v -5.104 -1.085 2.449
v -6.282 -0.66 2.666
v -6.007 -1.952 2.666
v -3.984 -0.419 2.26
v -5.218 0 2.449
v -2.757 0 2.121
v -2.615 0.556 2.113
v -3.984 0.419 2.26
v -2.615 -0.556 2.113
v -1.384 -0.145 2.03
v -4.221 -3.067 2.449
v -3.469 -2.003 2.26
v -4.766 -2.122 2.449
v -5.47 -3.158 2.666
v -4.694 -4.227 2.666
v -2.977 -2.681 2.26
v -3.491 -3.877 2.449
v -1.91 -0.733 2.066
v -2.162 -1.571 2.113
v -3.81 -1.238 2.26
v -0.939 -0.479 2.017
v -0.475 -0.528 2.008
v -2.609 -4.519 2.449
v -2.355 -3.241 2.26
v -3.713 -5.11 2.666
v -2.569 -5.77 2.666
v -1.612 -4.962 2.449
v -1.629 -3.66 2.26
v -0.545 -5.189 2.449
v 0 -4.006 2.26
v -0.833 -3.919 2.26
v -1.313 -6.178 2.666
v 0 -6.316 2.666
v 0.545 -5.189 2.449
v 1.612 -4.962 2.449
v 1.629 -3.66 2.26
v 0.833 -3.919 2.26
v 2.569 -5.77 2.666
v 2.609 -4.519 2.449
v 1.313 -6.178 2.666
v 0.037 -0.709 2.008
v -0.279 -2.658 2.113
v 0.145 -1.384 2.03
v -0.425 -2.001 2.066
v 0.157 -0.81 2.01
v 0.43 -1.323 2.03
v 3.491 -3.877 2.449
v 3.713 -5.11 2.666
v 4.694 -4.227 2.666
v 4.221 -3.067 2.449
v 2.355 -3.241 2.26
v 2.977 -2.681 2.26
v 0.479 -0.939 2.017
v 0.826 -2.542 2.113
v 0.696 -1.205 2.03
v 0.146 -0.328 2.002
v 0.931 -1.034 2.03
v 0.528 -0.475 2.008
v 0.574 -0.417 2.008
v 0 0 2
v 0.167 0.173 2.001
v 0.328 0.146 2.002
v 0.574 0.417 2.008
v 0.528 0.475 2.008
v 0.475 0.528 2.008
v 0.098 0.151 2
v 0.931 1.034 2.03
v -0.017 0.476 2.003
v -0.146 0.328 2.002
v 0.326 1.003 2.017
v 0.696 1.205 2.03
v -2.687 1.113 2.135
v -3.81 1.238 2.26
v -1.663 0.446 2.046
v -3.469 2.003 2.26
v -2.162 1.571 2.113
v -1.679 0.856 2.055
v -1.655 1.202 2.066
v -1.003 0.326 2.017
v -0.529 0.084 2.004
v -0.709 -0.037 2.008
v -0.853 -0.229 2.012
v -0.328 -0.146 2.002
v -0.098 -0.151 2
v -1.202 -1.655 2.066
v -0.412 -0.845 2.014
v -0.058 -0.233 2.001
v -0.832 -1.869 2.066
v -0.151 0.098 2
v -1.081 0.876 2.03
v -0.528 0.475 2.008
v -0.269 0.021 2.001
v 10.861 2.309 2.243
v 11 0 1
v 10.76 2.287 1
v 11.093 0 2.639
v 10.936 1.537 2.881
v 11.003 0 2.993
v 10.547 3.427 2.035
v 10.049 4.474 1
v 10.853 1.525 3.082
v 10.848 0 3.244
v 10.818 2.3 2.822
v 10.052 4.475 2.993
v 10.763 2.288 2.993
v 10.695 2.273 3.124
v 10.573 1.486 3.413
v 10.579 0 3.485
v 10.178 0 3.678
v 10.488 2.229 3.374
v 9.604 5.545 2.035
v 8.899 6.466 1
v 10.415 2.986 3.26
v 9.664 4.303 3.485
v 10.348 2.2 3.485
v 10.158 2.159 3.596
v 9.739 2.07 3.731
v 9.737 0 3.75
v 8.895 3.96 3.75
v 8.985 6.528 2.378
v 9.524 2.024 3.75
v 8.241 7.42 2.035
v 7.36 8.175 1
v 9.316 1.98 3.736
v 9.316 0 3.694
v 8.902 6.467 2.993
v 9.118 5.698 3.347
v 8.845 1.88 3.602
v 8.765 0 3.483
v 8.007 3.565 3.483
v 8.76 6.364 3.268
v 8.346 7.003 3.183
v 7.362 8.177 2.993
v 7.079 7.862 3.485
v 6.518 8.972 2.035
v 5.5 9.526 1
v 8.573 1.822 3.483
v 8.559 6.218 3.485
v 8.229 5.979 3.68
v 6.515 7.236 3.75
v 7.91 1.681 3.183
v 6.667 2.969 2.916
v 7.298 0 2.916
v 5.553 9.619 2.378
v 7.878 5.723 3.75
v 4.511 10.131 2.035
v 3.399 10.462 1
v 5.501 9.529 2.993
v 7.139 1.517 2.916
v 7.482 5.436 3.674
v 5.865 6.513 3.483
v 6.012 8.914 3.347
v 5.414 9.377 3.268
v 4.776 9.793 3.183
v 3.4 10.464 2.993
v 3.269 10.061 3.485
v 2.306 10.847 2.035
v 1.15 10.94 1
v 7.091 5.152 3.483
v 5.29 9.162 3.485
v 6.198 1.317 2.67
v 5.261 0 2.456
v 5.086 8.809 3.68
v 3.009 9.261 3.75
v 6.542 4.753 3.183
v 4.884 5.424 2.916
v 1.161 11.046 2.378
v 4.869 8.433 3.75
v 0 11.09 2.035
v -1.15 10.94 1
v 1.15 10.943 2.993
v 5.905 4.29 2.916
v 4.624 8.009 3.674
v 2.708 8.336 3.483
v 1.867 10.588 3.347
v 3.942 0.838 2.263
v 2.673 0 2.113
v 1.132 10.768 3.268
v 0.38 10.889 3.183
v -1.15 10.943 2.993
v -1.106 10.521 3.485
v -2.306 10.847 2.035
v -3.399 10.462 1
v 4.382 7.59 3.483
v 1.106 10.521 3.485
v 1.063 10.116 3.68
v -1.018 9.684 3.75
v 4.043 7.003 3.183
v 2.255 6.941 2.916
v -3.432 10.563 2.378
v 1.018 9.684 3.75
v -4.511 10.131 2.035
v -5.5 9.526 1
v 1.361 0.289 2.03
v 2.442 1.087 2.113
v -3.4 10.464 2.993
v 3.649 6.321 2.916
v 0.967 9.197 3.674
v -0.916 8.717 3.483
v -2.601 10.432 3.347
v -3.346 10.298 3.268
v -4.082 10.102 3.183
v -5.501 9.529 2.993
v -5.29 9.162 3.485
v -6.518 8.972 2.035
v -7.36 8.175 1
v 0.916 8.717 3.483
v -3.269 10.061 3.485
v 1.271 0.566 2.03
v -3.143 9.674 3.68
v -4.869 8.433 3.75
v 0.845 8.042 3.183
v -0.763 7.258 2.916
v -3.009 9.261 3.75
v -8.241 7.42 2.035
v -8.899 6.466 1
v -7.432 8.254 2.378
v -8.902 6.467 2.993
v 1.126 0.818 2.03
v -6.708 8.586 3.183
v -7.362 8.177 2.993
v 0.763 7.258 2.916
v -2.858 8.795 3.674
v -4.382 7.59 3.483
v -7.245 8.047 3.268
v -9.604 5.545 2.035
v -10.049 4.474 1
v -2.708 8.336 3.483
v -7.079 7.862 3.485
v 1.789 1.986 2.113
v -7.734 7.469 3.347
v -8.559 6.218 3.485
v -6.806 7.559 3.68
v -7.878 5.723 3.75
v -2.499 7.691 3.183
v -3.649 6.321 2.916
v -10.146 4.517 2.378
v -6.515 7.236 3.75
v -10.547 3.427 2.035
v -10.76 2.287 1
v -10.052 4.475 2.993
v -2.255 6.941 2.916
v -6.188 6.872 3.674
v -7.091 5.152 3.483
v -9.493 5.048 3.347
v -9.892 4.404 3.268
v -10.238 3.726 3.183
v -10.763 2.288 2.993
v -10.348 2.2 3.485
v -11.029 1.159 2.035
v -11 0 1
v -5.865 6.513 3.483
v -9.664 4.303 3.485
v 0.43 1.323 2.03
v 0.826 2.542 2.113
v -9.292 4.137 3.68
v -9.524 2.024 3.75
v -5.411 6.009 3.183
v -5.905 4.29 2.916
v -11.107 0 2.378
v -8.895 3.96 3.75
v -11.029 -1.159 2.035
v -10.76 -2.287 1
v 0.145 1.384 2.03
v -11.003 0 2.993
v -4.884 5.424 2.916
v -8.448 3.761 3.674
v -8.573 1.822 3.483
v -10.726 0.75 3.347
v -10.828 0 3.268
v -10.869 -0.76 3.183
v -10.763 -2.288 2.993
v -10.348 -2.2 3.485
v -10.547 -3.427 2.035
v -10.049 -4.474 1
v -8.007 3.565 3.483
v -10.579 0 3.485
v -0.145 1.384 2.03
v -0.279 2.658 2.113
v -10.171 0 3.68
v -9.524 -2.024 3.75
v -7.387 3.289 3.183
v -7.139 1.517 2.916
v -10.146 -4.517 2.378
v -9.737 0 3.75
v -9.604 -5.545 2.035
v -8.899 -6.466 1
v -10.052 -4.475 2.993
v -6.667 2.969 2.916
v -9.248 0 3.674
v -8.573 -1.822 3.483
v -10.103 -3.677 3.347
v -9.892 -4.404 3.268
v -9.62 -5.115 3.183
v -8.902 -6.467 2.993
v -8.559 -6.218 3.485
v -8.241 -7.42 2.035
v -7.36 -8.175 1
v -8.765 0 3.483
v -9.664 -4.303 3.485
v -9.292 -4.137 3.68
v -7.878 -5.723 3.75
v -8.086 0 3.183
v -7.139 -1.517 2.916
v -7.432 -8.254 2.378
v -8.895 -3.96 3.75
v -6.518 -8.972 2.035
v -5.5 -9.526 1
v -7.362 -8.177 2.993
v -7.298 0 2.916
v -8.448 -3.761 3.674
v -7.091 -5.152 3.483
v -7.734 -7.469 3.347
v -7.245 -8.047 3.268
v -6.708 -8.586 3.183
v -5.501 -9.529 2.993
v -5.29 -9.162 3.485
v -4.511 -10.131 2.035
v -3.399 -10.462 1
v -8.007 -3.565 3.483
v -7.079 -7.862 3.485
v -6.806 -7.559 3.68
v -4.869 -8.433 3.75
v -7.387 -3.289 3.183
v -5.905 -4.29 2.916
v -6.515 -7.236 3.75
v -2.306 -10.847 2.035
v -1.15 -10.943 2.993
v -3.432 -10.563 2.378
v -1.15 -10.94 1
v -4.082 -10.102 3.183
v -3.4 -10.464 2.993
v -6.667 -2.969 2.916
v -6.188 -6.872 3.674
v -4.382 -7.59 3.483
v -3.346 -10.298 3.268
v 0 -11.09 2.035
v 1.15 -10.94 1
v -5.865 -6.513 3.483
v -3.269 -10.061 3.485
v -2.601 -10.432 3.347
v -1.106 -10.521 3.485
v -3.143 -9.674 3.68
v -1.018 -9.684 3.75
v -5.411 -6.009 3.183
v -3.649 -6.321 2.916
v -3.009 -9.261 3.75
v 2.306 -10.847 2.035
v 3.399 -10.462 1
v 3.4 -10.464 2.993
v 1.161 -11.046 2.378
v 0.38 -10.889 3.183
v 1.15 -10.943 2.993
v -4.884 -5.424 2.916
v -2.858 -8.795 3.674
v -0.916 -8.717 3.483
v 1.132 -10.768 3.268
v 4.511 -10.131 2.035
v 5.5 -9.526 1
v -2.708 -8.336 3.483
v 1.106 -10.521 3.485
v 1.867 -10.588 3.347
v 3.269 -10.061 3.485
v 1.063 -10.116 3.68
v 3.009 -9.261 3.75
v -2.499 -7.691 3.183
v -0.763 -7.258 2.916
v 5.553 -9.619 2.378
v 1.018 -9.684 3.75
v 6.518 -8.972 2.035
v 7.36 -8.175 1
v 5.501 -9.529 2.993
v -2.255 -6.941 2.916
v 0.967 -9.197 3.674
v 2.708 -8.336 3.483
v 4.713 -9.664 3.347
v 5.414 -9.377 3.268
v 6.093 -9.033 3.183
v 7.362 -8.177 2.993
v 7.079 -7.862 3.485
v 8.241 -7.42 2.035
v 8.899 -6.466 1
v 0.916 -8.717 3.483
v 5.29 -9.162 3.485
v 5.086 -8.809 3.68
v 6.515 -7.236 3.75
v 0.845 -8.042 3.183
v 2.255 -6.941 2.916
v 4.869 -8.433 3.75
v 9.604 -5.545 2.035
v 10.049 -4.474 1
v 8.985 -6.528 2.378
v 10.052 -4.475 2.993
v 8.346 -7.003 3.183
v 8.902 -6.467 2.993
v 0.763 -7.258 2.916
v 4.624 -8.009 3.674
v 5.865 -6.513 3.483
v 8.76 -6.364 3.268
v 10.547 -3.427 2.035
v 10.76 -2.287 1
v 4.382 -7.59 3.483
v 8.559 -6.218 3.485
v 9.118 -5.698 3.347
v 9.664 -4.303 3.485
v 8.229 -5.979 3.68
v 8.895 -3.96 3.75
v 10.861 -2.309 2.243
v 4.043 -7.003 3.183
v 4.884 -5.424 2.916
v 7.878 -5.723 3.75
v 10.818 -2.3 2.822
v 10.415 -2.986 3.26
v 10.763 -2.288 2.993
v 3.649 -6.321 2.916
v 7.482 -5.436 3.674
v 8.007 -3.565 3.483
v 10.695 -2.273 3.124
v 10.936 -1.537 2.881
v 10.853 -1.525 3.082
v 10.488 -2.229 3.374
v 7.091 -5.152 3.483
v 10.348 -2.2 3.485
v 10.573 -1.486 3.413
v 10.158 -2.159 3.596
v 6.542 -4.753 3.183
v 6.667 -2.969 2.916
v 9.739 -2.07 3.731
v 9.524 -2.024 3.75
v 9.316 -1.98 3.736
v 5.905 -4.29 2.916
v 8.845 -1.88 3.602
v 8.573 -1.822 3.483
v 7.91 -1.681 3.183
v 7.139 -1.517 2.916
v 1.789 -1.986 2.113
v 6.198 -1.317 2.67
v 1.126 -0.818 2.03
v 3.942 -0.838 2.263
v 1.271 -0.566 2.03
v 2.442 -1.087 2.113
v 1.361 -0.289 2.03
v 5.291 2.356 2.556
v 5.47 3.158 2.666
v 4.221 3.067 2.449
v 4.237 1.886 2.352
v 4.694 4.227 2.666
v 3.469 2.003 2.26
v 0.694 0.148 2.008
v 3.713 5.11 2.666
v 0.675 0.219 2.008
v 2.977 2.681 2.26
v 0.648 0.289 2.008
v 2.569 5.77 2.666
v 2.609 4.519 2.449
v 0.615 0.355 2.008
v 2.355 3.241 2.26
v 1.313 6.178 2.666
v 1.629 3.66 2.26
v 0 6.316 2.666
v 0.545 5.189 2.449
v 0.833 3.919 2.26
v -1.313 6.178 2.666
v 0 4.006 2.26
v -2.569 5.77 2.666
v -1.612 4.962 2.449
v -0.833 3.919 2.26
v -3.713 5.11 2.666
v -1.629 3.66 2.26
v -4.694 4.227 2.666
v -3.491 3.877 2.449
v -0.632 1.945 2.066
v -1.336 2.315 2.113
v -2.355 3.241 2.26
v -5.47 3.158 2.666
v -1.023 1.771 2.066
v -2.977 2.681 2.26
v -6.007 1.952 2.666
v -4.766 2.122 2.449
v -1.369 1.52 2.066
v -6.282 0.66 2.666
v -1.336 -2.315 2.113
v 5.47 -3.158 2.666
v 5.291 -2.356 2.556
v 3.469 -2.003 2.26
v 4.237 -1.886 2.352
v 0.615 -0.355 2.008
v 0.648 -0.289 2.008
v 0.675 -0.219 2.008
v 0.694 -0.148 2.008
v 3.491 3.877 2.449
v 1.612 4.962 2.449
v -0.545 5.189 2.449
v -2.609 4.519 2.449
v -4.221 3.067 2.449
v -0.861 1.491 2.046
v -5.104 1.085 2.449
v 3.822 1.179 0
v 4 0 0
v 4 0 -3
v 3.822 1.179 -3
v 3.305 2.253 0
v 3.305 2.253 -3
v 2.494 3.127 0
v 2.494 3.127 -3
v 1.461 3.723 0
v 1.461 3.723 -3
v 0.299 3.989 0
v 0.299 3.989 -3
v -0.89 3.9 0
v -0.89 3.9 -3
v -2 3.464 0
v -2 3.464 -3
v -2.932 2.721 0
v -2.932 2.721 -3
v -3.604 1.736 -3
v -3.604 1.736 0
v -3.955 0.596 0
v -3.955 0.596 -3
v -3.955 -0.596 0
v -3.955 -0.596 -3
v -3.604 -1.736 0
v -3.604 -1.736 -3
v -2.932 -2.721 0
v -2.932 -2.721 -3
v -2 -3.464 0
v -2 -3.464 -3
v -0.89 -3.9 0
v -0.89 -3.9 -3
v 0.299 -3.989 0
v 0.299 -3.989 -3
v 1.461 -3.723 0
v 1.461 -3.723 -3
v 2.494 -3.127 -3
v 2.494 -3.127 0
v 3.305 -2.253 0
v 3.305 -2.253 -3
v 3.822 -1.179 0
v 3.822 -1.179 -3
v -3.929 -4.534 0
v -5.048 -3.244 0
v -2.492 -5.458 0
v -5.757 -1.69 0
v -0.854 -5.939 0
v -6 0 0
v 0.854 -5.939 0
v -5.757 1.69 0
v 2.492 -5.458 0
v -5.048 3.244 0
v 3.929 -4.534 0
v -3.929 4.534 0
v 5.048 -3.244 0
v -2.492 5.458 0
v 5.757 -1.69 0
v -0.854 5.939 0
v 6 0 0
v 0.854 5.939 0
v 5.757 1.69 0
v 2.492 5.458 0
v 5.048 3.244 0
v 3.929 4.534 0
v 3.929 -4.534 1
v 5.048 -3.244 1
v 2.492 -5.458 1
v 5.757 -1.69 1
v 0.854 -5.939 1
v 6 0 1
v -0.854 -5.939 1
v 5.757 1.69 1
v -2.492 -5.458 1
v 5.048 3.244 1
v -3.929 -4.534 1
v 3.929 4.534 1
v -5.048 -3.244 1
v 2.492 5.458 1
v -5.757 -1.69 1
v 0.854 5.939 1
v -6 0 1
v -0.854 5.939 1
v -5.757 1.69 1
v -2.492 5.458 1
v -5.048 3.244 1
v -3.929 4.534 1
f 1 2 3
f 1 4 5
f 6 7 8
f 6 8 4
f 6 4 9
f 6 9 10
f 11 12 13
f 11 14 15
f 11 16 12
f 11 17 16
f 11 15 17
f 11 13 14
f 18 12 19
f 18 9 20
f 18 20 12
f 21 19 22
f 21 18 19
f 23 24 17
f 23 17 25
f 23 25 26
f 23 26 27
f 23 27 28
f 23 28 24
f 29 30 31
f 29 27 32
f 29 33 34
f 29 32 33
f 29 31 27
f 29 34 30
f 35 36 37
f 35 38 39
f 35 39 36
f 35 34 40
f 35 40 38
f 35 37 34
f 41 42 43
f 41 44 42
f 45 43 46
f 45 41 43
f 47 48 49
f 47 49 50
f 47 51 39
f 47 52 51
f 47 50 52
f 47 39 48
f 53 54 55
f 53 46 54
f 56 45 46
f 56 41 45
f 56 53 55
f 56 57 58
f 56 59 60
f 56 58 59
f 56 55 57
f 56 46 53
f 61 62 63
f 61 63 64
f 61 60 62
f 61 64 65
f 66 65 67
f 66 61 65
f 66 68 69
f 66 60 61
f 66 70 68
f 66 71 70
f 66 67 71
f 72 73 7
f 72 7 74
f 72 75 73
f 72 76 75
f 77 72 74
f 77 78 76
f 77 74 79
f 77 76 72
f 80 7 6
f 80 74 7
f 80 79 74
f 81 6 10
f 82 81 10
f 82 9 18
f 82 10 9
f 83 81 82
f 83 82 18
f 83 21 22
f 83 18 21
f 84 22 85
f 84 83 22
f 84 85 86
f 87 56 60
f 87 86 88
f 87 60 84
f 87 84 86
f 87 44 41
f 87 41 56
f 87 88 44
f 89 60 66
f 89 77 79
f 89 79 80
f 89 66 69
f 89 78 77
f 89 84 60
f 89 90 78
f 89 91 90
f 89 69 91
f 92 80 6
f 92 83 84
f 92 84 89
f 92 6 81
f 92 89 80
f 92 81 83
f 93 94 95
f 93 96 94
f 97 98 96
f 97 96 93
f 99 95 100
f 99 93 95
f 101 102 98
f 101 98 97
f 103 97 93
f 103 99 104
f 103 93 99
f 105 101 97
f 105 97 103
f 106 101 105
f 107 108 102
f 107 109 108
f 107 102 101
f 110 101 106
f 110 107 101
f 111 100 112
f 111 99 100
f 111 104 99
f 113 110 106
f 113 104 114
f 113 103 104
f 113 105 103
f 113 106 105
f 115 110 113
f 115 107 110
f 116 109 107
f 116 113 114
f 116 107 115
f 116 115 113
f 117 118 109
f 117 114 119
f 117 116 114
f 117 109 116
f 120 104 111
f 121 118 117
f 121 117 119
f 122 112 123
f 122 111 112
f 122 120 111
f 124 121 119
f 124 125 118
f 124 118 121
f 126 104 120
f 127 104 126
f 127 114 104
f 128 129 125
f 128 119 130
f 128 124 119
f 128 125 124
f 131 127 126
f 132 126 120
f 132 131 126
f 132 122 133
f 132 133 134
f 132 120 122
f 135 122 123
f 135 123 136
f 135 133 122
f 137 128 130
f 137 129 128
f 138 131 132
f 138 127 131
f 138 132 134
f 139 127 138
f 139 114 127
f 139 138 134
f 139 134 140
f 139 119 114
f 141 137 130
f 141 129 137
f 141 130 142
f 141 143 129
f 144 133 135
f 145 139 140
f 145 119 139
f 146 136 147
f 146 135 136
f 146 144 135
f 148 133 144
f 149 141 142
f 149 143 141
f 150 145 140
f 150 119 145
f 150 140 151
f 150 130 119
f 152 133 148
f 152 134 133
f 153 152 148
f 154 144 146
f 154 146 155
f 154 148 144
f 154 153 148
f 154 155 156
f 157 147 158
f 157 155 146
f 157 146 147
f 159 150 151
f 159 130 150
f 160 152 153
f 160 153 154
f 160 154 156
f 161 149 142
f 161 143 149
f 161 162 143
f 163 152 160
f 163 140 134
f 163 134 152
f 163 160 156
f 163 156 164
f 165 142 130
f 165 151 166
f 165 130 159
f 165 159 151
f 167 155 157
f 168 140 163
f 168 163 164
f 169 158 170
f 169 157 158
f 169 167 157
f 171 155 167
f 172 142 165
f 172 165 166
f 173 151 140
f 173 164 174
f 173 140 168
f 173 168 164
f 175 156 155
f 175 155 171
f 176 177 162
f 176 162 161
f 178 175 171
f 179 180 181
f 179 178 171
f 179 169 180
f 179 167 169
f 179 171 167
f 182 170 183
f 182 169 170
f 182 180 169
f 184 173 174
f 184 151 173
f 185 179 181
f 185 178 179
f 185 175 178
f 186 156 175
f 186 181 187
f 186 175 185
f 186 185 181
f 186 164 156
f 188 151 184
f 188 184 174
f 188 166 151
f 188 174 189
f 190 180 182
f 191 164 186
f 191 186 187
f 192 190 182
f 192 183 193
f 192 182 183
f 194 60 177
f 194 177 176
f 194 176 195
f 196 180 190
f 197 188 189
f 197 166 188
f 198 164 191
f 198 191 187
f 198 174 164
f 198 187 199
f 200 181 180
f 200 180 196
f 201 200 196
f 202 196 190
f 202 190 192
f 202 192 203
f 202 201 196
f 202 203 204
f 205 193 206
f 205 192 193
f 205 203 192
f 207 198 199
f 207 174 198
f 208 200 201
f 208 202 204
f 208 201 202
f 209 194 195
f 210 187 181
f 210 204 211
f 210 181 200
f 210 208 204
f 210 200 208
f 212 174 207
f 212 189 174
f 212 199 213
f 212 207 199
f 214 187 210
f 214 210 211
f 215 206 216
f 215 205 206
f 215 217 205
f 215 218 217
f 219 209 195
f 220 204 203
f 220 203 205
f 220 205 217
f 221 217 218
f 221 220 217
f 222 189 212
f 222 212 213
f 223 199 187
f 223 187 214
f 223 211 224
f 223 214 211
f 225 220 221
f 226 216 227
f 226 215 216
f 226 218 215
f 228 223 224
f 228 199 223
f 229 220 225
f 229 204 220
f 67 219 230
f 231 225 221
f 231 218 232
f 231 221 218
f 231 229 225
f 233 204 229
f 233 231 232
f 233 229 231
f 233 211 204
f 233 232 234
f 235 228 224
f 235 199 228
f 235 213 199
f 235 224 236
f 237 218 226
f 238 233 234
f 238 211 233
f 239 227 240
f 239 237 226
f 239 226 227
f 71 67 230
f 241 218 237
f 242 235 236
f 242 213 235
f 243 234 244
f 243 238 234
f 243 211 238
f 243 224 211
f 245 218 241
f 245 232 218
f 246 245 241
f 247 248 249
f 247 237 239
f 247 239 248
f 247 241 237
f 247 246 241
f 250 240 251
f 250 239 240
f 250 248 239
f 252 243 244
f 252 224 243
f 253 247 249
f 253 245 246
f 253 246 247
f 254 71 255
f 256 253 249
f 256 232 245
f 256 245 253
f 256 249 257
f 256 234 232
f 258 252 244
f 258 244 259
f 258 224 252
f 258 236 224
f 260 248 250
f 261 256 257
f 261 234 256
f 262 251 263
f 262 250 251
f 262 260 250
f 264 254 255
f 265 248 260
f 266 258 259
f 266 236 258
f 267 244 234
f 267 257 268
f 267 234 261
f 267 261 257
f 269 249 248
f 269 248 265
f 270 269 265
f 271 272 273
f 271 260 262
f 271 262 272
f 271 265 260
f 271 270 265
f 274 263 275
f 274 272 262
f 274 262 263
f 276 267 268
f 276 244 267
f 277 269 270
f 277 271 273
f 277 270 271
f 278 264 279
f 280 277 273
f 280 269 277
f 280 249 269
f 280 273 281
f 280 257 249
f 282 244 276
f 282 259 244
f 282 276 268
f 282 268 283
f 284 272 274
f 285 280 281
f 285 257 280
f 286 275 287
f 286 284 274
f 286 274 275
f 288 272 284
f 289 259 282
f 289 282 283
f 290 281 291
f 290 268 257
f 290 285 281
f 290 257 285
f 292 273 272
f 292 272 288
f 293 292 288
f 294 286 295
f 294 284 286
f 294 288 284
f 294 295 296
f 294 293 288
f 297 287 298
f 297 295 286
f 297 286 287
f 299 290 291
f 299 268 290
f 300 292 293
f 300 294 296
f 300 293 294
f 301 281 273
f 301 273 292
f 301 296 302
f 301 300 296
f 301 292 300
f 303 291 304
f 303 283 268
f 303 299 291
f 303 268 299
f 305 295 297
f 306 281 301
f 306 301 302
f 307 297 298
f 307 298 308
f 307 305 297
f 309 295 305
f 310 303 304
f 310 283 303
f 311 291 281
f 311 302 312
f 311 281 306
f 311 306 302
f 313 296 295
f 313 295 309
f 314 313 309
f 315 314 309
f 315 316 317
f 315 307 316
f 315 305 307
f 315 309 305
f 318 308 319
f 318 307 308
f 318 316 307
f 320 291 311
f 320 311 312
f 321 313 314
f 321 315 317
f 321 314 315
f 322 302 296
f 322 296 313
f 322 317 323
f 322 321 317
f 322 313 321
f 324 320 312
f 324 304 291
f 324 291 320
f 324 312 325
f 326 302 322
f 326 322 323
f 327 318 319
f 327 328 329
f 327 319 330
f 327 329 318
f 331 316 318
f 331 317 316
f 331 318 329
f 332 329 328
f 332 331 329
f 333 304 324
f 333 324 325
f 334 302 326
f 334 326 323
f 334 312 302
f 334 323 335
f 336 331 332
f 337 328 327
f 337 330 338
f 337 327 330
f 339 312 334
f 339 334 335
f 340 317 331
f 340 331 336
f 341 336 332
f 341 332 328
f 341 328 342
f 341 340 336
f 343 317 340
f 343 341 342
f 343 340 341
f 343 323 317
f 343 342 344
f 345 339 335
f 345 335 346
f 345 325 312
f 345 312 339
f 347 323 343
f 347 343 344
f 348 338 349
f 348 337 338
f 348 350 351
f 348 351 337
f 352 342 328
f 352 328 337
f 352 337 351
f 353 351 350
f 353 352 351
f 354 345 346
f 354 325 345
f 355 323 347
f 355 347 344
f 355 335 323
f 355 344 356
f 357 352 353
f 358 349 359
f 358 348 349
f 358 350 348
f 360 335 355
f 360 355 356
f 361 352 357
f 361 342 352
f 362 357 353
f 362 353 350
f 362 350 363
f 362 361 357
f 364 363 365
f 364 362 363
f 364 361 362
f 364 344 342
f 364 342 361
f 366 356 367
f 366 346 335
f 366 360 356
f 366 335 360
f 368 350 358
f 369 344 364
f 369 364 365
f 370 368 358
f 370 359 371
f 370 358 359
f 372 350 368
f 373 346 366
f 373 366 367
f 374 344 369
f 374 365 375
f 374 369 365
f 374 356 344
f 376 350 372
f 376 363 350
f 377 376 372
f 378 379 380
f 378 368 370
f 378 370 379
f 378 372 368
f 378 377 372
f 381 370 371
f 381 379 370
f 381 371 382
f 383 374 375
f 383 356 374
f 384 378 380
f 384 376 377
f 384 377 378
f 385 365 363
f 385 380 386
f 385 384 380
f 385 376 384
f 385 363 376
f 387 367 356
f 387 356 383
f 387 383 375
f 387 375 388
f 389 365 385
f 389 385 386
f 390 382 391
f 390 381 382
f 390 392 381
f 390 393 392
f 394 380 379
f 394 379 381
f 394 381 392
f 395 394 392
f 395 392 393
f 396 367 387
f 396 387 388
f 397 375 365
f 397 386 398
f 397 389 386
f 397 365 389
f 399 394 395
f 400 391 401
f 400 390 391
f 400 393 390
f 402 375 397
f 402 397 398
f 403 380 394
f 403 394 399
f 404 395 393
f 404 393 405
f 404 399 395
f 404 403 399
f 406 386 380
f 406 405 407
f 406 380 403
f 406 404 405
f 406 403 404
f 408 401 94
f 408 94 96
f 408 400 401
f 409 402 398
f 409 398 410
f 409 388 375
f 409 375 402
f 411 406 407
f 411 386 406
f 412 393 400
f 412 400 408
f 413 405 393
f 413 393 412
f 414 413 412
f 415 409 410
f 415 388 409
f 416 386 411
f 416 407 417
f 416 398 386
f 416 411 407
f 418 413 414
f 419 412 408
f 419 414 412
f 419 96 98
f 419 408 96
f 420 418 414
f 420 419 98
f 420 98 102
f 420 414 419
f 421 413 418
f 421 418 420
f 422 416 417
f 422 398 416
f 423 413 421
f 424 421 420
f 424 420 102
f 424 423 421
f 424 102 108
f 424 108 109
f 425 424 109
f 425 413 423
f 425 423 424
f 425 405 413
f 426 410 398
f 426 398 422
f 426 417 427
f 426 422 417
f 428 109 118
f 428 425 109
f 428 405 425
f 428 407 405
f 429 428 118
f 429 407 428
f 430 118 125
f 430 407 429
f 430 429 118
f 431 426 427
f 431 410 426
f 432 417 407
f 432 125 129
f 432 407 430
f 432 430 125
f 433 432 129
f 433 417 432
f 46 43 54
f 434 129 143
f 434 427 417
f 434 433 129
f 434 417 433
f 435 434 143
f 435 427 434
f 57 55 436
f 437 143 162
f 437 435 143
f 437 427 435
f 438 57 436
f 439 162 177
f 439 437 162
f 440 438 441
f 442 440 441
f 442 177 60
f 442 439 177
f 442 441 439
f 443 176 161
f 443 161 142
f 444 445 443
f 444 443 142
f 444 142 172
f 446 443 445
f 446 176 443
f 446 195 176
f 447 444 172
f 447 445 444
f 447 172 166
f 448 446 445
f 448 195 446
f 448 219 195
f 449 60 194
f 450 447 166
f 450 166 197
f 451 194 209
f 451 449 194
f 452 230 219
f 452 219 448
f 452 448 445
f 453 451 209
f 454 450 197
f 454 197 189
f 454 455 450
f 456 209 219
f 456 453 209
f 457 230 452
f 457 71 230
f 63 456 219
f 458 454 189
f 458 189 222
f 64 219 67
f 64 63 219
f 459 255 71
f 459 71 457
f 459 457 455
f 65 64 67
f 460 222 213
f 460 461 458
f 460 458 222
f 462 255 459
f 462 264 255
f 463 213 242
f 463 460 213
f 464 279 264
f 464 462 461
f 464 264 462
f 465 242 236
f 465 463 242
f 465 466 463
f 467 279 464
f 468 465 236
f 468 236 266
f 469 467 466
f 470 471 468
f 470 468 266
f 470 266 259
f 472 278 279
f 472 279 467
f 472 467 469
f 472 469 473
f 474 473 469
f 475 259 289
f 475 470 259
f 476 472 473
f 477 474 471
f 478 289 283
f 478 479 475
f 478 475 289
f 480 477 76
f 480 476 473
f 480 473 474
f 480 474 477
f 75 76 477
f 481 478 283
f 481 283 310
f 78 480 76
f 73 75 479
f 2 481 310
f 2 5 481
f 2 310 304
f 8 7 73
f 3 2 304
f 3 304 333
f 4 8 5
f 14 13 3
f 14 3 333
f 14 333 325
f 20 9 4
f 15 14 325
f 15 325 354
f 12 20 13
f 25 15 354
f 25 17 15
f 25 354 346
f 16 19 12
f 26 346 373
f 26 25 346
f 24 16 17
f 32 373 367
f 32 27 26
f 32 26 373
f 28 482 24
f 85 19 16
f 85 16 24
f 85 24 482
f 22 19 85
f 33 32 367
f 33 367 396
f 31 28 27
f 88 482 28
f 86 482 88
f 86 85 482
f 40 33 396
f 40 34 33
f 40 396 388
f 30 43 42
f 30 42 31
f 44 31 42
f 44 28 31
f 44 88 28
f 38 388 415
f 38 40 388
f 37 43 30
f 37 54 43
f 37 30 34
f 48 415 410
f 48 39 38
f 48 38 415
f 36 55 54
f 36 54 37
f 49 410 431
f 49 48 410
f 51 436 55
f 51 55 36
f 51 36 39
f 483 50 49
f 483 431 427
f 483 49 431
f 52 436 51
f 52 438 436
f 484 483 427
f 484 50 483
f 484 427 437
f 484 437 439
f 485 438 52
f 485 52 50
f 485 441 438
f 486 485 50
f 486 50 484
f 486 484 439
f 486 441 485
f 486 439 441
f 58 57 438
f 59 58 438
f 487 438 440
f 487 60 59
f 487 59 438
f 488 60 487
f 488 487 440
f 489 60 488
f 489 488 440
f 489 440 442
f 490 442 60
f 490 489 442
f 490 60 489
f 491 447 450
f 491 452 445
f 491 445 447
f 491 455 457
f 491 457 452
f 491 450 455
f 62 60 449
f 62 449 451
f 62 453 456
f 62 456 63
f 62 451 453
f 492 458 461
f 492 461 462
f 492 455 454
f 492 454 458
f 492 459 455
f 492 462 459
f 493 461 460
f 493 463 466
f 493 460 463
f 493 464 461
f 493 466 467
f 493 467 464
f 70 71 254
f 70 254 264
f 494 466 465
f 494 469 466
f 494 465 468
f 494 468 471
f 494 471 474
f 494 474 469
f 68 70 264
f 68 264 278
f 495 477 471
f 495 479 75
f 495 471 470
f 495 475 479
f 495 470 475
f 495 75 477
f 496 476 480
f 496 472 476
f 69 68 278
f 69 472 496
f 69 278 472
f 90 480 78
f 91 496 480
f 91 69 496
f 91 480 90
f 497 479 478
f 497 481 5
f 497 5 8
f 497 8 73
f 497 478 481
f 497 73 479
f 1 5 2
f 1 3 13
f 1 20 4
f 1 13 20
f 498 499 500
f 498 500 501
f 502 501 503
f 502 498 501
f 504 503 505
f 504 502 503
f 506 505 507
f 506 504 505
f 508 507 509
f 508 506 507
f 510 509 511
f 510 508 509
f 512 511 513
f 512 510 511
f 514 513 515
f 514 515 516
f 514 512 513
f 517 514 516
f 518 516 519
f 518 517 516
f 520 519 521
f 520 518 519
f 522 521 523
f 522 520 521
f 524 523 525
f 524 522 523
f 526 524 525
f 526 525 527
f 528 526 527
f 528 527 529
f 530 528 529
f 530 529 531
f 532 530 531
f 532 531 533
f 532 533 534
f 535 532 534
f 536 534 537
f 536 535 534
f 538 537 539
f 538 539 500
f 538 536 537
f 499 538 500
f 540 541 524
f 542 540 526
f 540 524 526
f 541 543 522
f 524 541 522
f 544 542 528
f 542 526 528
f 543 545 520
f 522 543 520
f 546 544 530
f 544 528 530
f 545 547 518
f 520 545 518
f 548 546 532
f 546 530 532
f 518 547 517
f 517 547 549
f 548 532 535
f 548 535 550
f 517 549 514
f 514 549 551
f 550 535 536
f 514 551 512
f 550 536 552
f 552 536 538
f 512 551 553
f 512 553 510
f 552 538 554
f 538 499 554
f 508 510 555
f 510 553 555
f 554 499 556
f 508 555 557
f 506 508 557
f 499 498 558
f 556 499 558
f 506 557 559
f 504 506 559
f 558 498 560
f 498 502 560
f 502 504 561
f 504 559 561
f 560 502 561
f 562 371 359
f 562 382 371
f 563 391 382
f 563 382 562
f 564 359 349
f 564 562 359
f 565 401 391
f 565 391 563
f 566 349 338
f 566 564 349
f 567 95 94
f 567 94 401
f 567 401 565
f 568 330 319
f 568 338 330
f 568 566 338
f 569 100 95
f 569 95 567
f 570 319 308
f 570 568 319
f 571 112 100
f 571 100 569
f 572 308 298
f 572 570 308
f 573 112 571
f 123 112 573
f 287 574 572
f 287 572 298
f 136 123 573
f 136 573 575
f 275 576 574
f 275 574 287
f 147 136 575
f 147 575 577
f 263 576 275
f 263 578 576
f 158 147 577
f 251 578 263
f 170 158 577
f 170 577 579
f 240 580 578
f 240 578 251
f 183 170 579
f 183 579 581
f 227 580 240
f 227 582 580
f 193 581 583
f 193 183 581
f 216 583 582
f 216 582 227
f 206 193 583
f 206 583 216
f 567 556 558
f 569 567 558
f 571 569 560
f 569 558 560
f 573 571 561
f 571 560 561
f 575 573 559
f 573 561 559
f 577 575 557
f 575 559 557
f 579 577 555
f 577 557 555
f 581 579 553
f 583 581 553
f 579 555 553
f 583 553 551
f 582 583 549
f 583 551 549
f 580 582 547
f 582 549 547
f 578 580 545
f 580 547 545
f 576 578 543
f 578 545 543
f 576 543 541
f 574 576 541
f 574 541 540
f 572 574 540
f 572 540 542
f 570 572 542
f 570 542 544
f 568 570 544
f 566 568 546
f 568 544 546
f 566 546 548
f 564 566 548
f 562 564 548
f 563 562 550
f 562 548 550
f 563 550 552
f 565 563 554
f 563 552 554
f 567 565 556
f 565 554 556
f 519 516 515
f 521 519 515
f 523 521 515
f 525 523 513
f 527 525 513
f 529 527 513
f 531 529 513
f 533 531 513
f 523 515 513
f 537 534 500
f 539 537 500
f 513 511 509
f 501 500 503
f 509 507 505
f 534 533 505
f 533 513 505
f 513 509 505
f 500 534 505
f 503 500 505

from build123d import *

# Parameters (mm, degrees)
F0_R     = 4
F1_DEPTH = 3
F2_R     = 6
F2_R_2   = 4
F3_DEPTH = 1
F4_DEPTH = 1


with BuildPart() as f1:
    # F0 (on Top) → F1 (new body)
    with BuildSketch(Plane.XY):
        Circle(F0_R)
    extrude(amount=-F1_DEPTH)

    # F2 (on face) → F3 (join)
    with BuildSketch(Plane.XY):
        Circle(F2_R)
        Circle(F2_R_2, mode=Mode.SUBTRACT)
    extrude(amount=F3_DEPTH)

    # F4 (add, through all): a face of the model
    f4_faces = [f1.faces().sort_by_distance(p)[0] for p in [
        (0, 0, 0),
    ]]
    extrude(f4_faces, amount=F4_DEPTH)

    # F5 (on Front) → F6 (revolve)
    with BuildSketch(Plane.XZ):
        with BuildLine():
            Line((0, 2), (0, 1))
            Line((0, 1), (6, 1))
            Line((6, 1), (11, 1))
            add(Edge.make_bspline(
                [(11, 1), (11, 1.65), (11.4449391536, 3.1428787942), (9.6624643848, 4.0264235076), (8.2071766001, 3.1113625007), (5.2842991643, 2.3756880307), (2.2, 2), (0, 2)],
                knots=[0, 0, 0, 0, 0.1786214578, 0.3311174273, 0.4899368576, 0.7031797056, 1, 1, 1, 1], degree=3))
        make_face()
    revolve(axis=Axis((0, 0, 1.5), (0, 0, 1)))


solid = f1.part
